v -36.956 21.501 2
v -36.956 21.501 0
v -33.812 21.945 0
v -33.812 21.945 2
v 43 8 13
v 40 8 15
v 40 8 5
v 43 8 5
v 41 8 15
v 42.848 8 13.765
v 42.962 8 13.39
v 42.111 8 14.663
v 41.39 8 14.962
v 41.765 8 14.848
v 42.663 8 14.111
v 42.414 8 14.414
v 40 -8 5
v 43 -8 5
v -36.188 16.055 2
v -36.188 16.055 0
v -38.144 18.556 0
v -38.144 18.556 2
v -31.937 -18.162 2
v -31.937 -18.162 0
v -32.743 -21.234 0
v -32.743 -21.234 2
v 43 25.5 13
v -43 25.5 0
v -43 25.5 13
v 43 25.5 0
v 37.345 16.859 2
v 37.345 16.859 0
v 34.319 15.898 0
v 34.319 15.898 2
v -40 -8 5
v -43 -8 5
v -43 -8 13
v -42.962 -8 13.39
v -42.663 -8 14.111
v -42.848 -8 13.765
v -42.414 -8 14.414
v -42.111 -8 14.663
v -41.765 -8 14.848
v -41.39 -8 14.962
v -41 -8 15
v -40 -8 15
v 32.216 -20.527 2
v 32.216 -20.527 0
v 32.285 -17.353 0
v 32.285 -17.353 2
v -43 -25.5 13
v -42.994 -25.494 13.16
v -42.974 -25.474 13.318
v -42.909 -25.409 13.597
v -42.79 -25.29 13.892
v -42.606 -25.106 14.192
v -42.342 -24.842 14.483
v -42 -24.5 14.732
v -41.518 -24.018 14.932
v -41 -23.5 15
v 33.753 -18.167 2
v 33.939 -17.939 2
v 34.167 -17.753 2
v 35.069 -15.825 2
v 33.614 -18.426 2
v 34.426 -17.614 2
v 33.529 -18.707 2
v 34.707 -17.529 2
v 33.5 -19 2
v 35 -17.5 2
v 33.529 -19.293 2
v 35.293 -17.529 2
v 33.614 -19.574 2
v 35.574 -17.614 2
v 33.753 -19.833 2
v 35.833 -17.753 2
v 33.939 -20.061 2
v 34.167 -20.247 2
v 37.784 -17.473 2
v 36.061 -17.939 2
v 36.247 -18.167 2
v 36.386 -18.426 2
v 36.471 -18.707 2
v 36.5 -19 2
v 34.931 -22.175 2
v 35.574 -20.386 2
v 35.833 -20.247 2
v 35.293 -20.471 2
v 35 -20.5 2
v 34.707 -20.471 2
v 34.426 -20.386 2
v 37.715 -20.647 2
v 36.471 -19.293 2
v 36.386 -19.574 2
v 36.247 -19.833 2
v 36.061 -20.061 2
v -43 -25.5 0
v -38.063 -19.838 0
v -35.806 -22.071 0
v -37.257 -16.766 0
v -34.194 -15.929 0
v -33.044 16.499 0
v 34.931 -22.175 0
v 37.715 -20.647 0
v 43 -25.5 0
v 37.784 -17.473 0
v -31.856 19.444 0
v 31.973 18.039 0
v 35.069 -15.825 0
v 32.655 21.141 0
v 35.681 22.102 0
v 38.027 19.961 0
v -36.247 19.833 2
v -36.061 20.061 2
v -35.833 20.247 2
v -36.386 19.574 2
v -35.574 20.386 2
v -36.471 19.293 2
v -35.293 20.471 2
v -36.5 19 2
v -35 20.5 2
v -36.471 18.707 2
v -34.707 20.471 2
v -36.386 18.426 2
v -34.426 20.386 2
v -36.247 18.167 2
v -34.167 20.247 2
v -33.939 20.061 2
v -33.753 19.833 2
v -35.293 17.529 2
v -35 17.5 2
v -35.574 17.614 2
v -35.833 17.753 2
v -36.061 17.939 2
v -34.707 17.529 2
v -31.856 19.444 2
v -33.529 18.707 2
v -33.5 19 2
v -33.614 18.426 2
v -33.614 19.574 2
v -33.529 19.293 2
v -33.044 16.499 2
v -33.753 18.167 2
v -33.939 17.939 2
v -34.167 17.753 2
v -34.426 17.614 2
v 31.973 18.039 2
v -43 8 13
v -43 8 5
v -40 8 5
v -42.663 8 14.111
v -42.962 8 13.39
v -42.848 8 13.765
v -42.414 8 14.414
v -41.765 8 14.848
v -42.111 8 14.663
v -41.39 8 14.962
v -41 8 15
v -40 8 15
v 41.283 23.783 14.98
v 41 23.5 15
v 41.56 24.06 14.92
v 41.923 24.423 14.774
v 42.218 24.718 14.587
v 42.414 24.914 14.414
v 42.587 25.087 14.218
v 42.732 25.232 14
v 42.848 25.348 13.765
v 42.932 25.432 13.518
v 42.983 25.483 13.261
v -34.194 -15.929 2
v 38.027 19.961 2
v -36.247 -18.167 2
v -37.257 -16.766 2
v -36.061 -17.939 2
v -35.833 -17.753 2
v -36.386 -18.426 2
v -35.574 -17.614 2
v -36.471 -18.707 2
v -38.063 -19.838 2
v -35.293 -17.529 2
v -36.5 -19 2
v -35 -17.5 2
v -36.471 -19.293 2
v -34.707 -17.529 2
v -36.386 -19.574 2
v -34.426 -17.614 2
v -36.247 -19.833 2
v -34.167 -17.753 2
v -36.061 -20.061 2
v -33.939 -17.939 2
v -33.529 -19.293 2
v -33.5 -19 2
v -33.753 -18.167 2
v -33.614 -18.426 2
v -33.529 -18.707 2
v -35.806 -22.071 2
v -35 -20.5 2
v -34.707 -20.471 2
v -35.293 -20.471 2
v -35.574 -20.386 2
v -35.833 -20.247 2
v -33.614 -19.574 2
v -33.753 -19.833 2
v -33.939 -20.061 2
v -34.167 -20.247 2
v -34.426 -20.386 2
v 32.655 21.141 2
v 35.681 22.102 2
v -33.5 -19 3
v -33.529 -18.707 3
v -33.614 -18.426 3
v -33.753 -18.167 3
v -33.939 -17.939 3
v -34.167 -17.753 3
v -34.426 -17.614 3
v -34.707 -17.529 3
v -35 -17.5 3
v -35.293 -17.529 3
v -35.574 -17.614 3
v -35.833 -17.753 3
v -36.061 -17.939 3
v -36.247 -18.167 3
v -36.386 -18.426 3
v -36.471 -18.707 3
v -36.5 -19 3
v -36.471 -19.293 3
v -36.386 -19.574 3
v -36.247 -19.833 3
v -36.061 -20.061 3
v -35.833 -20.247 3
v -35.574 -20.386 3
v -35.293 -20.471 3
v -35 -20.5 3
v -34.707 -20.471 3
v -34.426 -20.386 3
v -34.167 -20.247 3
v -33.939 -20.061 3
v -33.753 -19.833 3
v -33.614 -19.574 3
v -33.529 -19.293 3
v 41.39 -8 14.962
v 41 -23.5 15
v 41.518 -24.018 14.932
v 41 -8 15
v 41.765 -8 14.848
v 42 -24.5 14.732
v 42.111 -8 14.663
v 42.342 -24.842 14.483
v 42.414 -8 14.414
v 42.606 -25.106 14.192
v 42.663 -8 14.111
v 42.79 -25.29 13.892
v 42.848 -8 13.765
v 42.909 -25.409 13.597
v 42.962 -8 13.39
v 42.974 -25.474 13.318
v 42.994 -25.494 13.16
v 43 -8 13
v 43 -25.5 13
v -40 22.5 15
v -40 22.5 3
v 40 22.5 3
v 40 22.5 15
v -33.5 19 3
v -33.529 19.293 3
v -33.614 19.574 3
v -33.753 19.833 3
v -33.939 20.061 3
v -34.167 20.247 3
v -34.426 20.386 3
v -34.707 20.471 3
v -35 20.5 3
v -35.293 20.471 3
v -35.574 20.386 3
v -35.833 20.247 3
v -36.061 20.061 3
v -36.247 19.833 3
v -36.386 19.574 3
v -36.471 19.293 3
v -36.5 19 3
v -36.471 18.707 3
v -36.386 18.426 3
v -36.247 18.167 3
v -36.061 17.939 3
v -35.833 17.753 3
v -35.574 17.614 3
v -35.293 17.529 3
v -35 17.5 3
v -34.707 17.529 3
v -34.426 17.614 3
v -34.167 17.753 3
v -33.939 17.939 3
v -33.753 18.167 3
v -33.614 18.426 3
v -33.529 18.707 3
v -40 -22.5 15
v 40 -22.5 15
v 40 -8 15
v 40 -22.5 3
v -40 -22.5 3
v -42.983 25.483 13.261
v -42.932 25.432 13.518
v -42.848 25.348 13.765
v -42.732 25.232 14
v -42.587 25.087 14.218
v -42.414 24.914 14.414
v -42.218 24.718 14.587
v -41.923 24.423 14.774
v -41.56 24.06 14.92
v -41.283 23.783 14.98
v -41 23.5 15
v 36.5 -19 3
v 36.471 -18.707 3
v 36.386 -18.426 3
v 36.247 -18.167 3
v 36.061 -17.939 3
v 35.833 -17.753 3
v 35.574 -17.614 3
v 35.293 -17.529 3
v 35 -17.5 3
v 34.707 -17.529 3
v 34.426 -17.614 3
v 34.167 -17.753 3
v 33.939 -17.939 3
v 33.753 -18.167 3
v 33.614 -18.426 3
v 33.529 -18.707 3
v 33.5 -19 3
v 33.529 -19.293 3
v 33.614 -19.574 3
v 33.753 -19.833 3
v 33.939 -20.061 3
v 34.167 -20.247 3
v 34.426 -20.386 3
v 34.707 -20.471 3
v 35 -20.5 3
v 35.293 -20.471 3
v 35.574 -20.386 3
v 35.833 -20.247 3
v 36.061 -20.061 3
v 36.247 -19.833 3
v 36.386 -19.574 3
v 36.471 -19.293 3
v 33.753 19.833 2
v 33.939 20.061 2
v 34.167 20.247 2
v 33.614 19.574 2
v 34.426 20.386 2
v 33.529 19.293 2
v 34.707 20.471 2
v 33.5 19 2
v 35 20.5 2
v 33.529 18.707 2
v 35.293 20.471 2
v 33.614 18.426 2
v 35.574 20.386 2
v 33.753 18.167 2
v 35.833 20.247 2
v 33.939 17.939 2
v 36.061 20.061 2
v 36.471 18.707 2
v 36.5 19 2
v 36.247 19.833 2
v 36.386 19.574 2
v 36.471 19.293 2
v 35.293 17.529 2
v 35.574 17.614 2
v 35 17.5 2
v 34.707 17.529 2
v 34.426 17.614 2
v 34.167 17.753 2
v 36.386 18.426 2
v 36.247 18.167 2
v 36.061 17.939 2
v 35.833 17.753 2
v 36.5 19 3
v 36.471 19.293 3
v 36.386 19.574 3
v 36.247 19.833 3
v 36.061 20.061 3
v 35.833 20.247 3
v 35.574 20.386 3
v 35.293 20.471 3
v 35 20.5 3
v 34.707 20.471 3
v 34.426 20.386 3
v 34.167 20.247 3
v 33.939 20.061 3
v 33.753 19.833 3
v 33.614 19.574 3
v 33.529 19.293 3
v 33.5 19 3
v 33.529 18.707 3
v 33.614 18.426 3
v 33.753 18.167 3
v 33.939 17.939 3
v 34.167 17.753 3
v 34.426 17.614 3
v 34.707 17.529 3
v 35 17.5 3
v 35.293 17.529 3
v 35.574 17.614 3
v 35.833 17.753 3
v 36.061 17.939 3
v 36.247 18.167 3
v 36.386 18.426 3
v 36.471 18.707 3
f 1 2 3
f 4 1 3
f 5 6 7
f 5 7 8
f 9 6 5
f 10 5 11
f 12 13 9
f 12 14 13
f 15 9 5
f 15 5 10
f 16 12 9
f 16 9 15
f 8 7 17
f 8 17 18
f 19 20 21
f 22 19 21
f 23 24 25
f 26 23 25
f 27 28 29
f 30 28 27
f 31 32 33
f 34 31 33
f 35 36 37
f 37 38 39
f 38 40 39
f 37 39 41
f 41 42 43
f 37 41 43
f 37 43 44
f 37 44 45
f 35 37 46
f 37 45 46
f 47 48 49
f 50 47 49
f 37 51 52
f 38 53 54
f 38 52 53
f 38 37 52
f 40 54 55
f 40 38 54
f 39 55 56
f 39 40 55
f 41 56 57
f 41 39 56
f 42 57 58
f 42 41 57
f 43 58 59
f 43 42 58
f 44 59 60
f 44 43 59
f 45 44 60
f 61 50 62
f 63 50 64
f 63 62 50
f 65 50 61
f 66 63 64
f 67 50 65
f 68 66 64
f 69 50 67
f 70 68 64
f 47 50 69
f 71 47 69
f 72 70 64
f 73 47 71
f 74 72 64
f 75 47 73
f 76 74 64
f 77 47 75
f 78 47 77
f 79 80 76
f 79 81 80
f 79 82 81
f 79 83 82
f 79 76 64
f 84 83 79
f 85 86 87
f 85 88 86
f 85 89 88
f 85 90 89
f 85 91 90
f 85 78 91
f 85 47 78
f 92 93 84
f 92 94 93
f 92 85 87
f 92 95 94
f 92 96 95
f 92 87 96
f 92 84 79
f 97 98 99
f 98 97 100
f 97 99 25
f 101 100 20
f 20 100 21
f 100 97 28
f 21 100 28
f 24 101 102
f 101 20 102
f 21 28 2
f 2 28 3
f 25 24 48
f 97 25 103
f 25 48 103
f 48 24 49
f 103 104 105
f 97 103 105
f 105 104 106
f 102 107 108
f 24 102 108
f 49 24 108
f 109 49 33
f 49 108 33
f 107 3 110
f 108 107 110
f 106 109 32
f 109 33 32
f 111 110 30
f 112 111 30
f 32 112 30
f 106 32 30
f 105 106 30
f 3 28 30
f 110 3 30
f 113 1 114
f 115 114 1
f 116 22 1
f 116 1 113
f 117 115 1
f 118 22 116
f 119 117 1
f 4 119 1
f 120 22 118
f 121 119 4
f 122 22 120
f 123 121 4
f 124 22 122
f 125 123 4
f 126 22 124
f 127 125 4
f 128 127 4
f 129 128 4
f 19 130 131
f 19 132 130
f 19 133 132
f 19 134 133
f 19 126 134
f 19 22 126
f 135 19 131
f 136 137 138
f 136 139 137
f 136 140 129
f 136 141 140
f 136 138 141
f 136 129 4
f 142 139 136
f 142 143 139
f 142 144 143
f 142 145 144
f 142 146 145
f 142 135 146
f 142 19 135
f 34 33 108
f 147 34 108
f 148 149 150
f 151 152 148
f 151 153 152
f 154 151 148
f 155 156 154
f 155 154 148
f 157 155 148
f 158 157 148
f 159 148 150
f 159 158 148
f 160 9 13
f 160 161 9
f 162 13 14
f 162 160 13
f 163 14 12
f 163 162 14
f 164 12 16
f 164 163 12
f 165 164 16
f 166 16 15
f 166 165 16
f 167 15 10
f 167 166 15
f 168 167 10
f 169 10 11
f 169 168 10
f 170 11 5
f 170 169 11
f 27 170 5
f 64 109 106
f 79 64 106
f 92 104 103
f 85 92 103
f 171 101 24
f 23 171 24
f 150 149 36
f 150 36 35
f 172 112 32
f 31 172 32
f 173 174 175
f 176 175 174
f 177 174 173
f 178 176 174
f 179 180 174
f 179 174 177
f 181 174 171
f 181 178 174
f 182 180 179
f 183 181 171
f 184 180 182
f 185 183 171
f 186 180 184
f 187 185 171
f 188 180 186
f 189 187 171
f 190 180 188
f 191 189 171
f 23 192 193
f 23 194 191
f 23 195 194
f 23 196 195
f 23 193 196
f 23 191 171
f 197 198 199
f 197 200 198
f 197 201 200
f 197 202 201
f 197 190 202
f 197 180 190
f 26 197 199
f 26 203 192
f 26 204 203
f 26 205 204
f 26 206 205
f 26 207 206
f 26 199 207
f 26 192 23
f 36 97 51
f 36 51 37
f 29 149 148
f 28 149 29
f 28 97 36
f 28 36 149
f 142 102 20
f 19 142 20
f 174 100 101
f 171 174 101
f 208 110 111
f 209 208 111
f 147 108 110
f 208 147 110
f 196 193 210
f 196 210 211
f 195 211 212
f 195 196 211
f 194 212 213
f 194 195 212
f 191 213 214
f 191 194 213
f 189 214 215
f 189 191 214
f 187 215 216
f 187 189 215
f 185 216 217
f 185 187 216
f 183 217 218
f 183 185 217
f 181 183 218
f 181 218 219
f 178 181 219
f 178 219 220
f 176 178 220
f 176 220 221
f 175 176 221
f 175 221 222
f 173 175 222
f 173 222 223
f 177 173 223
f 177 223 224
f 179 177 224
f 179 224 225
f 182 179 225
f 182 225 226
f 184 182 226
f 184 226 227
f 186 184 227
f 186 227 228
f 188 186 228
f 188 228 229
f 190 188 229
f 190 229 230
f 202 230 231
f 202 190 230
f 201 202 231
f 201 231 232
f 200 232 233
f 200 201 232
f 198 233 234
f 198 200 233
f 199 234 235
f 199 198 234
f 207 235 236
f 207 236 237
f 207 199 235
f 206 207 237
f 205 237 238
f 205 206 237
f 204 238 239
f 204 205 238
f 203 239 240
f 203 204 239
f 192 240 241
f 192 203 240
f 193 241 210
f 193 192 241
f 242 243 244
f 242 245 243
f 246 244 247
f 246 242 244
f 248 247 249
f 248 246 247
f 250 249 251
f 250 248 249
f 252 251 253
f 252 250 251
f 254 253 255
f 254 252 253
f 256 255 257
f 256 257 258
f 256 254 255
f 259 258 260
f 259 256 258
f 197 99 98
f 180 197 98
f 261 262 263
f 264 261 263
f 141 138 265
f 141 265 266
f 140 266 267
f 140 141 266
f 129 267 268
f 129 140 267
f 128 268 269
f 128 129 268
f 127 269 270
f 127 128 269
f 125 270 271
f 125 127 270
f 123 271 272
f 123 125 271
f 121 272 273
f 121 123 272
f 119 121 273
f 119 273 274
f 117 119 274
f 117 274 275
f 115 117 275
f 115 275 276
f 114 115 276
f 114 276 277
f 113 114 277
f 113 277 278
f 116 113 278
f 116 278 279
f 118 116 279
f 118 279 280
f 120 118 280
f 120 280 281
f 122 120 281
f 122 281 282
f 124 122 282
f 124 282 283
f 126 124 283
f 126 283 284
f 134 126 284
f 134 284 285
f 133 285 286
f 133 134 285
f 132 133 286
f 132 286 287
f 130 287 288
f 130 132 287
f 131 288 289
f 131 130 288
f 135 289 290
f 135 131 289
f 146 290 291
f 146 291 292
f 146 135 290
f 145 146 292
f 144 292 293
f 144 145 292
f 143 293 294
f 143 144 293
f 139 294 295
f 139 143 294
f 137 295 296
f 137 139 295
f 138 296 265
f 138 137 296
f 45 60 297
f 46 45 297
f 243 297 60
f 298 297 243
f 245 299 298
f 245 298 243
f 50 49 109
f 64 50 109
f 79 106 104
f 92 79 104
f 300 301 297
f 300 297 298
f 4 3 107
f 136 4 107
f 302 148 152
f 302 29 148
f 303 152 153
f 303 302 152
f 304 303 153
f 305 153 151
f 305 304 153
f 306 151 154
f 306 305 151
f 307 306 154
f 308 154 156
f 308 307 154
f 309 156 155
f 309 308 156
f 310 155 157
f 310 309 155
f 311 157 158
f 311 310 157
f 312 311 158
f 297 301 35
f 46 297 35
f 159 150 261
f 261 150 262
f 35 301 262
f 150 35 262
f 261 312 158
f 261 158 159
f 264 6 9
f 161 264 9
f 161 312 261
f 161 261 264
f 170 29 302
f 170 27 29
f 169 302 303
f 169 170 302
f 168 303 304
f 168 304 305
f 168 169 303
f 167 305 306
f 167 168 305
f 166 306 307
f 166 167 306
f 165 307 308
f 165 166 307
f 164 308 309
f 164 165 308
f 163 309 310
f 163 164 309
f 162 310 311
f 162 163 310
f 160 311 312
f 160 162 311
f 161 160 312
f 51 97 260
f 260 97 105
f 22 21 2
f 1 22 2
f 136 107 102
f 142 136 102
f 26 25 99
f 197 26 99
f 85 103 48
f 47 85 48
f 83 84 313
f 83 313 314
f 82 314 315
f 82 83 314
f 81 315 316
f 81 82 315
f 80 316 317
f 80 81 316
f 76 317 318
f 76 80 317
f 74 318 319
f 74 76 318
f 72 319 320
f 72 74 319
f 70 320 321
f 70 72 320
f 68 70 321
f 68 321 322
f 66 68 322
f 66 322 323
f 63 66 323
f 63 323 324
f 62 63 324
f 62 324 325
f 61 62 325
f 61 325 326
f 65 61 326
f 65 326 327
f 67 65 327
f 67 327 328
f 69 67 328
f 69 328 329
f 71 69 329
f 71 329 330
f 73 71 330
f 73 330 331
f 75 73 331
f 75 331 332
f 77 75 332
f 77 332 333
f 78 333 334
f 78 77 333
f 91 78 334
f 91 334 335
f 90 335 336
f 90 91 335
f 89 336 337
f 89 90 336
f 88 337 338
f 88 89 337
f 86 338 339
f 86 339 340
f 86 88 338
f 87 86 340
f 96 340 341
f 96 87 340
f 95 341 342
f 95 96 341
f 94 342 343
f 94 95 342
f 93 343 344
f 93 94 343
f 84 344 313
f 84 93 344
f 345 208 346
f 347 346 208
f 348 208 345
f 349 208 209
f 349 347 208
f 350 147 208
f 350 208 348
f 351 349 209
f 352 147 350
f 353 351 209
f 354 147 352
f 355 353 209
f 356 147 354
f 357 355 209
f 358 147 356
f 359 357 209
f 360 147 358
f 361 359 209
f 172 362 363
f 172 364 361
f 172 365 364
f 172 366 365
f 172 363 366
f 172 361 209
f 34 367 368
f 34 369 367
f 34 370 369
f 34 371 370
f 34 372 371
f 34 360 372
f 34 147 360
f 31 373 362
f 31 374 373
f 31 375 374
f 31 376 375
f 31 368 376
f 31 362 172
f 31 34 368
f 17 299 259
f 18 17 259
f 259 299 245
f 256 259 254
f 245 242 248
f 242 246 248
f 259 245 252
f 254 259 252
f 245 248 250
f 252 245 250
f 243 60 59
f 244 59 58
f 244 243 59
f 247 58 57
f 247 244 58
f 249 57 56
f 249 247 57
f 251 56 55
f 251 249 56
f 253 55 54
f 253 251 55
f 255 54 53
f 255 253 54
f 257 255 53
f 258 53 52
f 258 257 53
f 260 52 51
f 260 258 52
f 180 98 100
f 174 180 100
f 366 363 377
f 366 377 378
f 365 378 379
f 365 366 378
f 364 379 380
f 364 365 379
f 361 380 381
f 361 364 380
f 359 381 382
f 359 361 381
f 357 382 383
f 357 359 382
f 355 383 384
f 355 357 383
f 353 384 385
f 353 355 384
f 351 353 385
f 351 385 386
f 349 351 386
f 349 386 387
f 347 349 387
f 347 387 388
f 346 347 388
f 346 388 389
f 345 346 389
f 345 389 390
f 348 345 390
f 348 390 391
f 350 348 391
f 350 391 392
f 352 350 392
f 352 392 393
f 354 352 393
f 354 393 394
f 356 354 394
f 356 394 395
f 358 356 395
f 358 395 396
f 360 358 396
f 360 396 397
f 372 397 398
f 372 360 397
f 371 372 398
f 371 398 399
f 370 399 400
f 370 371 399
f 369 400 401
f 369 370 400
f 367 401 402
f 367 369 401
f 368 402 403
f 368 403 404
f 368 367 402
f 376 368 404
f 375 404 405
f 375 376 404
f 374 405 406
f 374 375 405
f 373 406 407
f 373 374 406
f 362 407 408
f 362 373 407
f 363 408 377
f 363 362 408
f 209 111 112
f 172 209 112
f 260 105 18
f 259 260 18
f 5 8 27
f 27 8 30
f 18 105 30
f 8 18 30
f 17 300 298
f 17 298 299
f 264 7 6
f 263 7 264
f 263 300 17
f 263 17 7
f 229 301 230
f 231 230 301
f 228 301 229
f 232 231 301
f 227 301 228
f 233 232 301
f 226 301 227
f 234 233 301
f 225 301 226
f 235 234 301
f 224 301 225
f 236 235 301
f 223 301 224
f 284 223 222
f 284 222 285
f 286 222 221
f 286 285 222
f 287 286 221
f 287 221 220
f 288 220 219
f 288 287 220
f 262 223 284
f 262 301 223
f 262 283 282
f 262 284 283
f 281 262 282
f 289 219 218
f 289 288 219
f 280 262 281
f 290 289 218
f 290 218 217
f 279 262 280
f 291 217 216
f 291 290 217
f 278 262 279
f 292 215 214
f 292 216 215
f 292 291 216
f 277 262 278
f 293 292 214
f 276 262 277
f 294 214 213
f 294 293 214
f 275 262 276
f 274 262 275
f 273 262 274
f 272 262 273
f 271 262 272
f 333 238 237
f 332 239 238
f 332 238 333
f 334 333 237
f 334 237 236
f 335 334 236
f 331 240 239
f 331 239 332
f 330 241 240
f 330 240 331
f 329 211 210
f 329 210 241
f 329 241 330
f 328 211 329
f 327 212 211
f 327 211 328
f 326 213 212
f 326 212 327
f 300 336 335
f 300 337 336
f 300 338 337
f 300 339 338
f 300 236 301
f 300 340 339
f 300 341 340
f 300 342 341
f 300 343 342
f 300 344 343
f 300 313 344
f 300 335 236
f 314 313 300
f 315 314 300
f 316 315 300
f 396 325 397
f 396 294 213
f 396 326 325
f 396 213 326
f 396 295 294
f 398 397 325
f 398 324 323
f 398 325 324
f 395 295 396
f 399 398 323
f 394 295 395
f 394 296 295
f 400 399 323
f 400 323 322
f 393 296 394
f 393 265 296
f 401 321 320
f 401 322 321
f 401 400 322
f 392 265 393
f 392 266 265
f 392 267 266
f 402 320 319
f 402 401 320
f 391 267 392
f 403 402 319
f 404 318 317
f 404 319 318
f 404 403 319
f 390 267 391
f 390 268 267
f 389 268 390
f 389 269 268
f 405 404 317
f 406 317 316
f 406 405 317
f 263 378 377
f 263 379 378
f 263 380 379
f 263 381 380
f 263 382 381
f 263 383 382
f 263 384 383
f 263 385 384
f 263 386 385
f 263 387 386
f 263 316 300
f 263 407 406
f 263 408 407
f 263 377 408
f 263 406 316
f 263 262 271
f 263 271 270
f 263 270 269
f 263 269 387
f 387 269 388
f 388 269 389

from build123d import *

# Parameters (mm, degrees)
F0_W     = 86
F0_H     = 51
F0_W_2   = 80
F0_H_2   = 45
F0_R     = 1.5
F1_DEPTH = 3
F2_DEPTH = 15
F3_W     = 3
F3_H     = 16
F4_DEPTH = 10
F6_R     = 1.5
F7_DEPTH = 2
F8_R     = 2


with BuildPart() as f1:
    # F0 (on Top) → F1 (new body)
    with BuildSketch(Plane.XY):
        Rectangle(F0_W, F0_H)
        Rectangle(F0_W_2, F0_H_2, mode=Mode.SUBTRACT)
        Rectangle(F0_W_2, F0_H_2)
        with Locations((-35, -19)):
            Circle(F0_R, mode=Mode.SUBTRACT)
        with Locations((35, -19)):
            Circle(F0_R, mode=Mode.SUBTRACT)
        with Locations((-35, 19)):
            Circle(F0_R, mode=Mode.SUBTRACT)
        with Locations((35, 19)):
            Circle(F0_R, mode=Mode.SUBTRACT)
    extrude(amount=F1_DEPTH)

    # F0 (on Top) → F2 (join)
    with BuildSketch(Plane.XY):
        Rectangle(F0_W, F0_H)
        Rectangle(F0_W_2, F0_H_2, mode=Mode.SUBTRACT)
    extrude(amount=F2_DEPTH)

    # F3 (on face) → F4 (cut)
    with BuildSketch(Plane.XY.offset(15)):
        with Locations((-41.5, 0)):
            Rectangle(F3_W, F3_H)
        with Locations((41.5, 0)):
            Rectangle(F3_W, F3_H)
    extrude(amount=-F4_DEPTH, mode=Mode.SUBTRACT)

    # F6 (on face) → F7 (cut)
    with BuildSketch(Plane(origin=(0, 0, 0), x_dir=(1, 0, 0), z_dir=(0, 0, -1))):
        Polygon((-34.1939000371, 15.9285937776), (-31.9370342046, 18.1623999346), (-32.7431341675, 21.2338061571), (-35.8060999629, 22.0714062224), (-38.0629657954, 19.8376000654), (-37.2568658325, 16.7661938429), align=None)
        with Locations((-35, 19)):
            Circle(F6_R, mode=Mode.SUBTRACT)
        Polygon((-33.8121897672, -21.9449007087), (-31.8557360582, -19.4437765179), (-33.043546291, -16.4988758092), (-36.1878102328, -16.0550992913), (-38.1442639418, -18.5562234821), (-36.956453709, -21.5011241908), align=None)
        with Locations((-35, -19)):
            Circle(F6_R, mode=Mode.SUBTRACT)
        Polygon((35.6810371117, -22.1015353917), (38.0265269958, -19.9609722562), (37.3454898841, -16.8594368645), (34.3189628883, -15.8984646083), (31.9734730042, -18.0390277438), (32.6545101159, -21.1405631355), align=None)
        with Locations((35, -19)):
            Circle(F6_R, mode=Mode.SUBTRACT)
        Polygon((35.0691377179, 15.8253262673), (37.7839169602, 17.4725381537), (37.7147792423, 20.6472118864), (34.9308622821, 22.1746737327), (32.2160830398, 20.5274618463), (32.2852207577, 17.3527881136), align=None)
        with Locations((35, 19)):
            Circle(F6_R, mode=Mode.SUBTRACT)
    extrude(amount=-F7_DEPTH, mode=Mode.SUBTRACT)

    # F8
    f8_edges = [f1.edges().sort_by_distance(p)[0] for p in [
        (0, -25.5, 15),
        (0, 25.5, 15),
        (43, 16.75, 15),
        (43, -16.75, 15),
        (-43, 16.75, 15),
        (-43, -16.75, 15),
    ]]
    fillet(f8_edges, radius=F8_R)


solid = f1.part
